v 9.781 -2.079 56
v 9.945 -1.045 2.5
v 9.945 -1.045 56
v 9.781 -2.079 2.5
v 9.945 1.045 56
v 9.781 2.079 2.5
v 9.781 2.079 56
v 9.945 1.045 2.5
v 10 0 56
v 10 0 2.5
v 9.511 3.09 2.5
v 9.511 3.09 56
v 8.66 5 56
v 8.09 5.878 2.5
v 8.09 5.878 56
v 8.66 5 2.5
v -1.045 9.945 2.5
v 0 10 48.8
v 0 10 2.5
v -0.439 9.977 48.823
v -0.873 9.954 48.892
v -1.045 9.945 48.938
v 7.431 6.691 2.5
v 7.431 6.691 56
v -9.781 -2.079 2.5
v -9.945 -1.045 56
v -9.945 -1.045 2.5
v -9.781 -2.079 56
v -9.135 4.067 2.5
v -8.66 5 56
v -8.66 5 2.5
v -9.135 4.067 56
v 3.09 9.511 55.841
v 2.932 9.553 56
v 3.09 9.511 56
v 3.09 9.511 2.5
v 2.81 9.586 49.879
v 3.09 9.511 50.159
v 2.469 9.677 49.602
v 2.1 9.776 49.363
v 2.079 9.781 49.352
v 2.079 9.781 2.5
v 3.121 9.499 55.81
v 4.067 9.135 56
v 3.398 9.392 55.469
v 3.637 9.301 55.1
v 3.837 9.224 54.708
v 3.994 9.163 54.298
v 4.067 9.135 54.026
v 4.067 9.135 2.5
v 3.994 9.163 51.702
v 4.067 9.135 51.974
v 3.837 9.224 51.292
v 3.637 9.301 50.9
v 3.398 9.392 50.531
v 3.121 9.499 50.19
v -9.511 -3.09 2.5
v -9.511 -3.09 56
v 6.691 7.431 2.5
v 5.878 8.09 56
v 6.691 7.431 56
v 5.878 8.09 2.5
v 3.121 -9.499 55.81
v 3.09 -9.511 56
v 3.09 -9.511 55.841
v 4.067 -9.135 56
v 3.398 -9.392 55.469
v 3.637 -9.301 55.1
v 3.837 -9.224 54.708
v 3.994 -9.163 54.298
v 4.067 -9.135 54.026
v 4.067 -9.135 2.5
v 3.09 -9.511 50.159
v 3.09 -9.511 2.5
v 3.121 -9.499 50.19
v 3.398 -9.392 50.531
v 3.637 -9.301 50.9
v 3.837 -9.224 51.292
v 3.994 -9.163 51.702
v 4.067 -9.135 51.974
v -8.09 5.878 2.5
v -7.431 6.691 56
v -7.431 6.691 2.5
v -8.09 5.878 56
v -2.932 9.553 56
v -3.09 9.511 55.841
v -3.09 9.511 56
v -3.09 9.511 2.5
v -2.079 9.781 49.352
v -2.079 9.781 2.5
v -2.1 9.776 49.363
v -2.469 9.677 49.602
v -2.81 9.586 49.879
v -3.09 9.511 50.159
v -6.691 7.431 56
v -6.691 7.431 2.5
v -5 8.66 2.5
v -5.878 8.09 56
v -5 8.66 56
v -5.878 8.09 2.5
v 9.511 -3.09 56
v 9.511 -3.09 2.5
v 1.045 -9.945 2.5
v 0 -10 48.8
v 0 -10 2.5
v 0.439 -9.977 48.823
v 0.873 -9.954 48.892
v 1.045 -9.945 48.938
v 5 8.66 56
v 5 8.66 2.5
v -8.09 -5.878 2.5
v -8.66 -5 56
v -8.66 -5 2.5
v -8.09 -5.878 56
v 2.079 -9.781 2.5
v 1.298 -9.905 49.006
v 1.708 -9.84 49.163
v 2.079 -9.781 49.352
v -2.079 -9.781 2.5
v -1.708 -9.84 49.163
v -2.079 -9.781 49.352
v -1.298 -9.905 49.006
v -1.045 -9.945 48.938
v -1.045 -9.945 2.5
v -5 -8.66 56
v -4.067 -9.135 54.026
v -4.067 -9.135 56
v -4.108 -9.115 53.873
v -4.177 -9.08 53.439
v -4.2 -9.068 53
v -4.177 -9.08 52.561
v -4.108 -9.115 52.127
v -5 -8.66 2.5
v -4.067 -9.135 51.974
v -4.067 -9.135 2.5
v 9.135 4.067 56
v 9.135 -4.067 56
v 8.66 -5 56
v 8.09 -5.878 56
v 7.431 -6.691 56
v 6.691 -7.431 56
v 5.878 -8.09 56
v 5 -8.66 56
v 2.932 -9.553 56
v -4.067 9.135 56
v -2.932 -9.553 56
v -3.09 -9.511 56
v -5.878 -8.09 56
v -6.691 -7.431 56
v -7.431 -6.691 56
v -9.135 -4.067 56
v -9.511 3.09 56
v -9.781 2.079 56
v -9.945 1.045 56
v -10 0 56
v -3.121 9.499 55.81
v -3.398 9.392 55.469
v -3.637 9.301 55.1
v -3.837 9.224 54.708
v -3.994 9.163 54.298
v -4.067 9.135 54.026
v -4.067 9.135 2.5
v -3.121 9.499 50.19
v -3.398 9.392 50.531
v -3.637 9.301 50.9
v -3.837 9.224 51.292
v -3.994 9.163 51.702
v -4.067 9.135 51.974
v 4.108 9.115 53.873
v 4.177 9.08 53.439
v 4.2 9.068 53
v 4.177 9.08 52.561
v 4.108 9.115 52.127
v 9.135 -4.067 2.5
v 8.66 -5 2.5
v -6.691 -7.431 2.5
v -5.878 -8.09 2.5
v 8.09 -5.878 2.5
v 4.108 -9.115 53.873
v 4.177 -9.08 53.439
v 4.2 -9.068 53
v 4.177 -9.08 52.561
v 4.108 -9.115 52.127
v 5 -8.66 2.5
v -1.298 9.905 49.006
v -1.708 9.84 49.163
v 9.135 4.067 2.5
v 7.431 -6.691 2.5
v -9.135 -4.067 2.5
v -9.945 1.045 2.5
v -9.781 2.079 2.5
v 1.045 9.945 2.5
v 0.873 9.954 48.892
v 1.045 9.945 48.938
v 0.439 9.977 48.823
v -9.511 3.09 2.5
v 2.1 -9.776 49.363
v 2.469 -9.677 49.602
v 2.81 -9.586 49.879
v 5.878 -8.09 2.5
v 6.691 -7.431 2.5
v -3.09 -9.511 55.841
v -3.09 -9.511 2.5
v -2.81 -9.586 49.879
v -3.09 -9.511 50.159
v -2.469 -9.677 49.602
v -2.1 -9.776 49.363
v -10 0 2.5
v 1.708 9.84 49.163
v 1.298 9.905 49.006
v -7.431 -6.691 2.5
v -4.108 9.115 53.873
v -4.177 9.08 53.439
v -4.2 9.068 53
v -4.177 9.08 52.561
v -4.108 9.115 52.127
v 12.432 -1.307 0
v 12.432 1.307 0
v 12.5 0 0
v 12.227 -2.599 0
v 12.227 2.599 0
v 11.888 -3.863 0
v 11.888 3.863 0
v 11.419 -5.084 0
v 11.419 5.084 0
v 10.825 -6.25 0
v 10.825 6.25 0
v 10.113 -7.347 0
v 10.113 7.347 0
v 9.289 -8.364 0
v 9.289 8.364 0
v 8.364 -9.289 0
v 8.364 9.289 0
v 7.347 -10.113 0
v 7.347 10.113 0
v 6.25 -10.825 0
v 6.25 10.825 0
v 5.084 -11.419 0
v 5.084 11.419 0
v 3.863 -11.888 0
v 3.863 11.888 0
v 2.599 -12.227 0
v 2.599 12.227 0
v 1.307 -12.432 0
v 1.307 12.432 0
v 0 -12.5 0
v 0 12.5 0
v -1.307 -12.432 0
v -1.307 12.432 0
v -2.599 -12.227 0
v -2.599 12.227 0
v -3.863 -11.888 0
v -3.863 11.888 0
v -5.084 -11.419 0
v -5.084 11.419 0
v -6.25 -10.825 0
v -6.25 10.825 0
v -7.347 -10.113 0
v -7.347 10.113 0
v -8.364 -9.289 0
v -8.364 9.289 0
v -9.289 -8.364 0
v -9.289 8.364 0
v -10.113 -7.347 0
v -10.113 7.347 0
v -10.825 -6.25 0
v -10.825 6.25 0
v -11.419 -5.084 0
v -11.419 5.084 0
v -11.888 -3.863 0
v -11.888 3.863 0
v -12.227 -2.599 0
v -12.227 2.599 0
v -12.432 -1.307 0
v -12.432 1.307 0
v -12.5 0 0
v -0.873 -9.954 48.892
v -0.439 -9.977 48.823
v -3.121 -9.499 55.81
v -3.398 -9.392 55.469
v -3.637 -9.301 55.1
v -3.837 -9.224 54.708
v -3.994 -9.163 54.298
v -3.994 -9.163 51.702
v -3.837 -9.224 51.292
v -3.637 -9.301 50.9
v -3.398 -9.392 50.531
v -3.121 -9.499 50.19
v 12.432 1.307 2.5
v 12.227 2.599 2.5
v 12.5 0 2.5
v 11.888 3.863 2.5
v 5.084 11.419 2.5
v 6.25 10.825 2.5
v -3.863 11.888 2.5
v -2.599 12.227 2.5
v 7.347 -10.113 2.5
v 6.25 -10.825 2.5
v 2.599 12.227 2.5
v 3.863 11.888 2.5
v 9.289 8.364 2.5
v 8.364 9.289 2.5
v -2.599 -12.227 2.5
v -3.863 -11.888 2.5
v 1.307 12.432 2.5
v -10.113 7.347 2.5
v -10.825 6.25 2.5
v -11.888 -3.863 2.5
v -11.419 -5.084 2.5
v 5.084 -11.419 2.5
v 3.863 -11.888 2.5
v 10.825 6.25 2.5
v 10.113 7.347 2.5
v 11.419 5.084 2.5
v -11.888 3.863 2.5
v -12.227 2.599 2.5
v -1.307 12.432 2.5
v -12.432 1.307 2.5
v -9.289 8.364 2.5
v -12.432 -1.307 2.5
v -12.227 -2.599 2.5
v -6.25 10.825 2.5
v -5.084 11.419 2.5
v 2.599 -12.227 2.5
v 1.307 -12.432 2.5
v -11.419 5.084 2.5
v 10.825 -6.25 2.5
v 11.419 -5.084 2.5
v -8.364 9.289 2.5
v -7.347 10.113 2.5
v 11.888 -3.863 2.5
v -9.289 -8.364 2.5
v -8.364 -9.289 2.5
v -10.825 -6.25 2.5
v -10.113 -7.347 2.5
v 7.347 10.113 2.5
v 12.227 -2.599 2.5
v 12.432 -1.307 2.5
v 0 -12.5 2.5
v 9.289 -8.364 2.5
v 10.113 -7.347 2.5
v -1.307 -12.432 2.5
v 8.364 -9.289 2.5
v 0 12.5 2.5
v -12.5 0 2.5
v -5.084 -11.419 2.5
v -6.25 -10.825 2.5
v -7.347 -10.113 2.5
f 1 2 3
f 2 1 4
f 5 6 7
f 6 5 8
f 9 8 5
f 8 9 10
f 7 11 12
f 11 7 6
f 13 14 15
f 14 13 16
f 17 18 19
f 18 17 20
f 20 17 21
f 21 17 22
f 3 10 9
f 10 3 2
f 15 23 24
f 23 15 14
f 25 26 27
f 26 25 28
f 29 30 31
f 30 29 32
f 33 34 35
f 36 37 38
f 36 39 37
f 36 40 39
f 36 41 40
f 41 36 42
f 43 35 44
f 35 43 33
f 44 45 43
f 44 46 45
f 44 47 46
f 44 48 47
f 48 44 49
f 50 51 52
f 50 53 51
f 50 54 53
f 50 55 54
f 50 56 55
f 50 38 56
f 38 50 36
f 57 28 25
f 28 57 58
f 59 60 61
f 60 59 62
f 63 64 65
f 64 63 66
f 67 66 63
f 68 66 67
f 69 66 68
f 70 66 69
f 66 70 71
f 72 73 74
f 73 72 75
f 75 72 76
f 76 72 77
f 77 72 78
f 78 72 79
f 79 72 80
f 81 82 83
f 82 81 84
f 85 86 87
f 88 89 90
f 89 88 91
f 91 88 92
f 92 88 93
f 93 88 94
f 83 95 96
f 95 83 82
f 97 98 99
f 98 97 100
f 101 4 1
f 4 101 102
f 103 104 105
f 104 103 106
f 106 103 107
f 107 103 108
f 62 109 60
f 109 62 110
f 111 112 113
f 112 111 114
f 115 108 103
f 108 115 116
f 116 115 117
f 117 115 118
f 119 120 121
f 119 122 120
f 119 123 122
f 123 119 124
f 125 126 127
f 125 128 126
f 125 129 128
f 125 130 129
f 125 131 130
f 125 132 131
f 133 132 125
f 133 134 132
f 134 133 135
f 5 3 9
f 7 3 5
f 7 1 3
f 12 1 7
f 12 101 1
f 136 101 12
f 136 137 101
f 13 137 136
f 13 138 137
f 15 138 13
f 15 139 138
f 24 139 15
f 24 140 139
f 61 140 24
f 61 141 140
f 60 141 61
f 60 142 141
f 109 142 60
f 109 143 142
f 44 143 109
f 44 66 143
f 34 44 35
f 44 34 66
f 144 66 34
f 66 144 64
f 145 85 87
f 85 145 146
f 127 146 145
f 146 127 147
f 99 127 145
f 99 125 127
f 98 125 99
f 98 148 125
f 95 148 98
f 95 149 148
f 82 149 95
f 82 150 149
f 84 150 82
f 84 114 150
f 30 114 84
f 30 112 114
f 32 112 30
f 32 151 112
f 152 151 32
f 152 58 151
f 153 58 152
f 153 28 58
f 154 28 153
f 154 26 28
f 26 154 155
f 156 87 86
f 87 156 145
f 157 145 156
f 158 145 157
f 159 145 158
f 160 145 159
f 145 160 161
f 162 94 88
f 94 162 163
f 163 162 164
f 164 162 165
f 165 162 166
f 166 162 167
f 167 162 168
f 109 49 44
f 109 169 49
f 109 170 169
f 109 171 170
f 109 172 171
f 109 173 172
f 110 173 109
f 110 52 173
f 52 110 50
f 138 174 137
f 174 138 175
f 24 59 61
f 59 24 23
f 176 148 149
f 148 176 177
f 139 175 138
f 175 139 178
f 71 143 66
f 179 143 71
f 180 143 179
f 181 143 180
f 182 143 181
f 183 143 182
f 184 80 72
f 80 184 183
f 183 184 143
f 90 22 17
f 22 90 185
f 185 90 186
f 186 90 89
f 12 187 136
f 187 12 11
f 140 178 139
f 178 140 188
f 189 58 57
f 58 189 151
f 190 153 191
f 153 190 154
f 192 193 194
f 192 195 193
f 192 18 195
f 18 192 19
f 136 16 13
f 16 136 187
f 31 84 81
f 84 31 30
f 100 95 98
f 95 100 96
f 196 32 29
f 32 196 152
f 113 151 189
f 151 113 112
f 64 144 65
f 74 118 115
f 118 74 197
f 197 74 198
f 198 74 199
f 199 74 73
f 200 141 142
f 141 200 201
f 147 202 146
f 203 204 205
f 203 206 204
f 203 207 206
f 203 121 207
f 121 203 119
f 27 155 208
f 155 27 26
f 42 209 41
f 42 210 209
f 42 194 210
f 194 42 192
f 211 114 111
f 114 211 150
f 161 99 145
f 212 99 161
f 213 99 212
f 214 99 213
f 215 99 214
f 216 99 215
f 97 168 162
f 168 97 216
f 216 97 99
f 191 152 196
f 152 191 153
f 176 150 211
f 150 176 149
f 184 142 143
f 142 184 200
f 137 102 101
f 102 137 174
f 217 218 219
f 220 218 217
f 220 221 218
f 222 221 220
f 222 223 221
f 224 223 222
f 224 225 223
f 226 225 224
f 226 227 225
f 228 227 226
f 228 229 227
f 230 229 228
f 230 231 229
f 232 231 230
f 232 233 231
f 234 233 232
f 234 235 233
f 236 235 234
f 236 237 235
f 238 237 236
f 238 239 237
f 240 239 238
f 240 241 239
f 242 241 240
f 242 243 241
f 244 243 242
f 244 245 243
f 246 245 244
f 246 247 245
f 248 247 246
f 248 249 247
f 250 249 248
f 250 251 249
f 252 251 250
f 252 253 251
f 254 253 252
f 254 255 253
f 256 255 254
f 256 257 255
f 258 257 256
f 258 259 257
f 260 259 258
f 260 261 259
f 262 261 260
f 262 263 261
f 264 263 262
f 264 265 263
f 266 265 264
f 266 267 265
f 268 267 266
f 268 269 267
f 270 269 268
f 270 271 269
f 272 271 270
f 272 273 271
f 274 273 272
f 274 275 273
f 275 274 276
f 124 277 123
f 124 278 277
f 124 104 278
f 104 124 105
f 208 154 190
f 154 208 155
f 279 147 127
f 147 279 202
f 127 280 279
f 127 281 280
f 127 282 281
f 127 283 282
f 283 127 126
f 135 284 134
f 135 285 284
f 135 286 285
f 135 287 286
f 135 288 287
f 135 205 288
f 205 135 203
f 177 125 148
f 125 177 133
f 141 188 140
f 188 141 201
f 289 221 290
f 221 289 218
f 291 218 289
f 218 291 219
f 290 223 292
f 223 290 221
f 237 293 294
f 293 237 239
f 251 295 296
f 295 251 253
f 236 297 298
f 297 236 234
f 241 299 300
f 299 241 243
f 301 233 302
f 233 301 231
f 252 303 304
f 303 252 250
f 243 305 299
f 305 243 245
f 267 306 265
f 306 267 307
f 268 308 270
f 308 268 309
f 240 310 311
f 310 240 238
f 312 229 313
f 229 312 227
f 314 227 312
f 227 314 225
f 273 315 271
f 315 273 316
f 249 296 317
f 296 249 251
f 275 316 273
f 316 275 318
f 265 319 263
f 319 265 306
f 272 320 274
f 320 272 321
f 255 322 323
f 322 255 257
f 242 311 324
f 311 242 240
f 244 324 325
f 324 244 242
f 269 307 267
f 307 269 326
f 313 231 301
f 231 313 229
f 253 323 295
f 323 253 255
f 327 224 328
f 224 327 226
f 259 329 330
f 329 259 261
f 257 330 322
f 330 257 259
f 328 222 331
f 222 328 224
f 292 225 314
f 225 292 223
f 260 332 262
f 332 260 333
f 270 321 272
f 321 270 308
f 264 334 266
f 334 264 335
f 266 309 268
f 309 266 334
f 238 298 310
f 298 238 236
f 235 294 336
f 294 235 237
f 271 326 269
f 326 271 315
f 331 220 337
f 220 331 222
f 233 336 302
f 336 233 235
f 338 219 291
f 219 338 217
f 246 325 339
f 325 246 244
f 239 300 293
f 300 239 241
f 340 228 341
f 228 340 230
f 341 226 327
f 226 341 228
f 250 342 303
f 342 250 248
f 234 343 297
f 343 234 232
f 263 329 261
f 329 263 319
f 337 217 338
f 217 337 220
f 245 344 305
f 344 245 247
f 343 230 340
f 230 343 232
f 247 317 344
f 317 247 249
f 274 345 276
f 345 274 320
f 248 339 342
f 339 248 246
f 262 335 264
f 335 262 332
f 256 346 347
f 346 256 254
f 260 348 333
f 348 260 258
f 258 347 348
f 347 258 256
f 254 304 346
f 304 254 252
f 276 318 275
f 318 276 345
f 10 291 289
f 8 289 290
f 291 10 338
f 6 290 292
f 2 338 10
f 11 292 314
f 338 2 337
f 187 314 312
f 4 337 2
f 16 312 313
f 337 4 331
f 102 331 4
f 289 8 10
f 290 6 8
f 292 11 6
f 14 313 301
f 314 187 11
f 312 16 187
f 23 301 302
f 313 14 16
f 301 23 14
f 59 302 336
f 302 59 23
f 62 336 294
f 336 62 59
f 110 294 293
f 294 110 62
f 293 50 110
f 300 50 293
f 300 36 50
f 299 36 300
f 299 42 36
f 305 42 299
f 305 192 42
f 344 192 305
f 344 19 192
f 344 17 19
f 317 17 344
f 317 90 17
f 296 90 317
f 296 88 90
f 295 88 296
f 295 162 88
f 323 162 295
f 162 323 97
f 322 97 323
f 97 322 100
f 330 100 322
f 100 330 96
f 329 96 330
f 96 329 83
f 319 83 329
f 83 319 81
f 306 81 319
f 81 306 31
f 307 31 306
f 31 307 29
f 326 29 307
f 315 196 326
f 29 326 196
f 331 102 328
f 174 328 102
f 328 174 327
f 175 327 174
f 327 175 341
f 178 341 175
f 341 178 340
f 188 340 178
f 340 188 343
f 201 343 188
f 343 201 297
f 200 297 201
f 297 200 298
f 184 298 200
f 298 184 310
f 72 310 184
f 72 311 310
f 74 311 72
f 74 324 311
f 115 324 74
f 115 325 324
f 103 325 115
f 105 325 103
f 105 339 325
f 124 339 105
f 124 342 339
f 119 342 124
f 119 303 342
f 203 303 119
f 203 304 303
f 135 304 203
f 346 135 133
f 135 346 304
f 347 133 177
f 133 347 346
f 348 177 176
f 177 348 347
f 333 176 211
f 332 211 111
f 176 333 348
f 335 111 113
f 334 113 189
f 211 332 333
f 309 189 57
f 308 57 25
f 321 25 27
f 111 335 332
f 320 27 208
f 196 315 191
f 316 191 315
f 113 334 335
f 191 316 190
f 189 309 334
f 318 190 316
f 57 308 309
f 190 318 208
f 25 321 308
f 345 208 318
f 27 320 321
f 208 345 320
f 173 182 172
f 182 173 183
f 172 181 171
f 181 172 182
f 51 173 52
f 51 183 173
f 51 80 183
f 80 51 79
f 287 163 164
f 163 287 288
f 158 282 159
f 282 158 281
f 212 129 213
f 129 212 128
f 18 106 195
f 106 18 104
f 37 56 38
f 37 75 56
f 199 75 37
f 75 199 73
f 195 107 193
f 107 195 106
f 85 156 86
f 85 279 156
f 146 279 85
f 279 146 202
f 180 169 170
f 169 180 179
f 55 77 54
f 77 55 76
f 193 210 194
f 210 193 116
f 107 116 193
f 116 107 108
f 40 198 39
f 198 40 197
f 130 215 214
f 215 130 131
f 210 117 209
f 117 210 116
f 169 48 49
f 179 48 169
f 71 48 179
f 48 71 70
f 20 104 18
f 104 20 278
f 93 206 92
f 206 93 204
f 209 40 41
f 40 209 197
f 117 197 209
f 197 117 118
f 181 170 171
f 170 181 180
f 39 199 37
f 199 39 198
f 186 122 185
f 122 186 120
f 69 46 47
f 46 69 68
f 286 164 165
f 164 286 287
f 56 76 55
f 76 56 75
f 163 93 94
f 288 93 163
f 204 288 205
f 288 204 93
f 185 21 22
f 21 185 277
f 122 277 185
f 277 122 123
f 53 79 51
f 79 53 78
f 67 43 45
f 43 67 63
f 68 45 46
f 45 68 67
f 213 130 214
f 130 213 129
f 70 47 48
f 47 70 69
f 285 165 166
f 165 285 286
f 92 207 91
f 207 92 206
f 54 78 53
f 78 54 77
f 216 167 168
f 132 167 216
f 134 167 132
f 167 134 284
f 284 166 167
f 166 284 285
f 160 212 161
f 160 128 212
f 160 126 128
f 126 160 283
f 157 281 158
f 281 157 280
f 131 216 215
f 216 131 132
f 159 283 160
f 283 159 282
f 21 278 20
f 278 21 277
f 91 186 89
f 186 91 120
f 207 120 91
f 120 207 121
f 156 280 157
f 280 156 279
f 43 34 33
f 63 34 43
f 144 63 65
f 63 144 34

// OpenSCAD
// Clevis pin with cross-hole.
$fn = 60;
eps = 0.02;
pin_d = 20;
pin_l = 56;
head_d = pin_d + 5;
difference() {
    union() { cylinder(d=pin_d,h=pin_l); cylinder(d=head_d,h=2.5); }
    translate([0,-pin_d-eps,pin_l-3]) rotate([-90,0,0]) cylinder(d=pin_d*0.42,h=2*pin_d+2*eps);
}
